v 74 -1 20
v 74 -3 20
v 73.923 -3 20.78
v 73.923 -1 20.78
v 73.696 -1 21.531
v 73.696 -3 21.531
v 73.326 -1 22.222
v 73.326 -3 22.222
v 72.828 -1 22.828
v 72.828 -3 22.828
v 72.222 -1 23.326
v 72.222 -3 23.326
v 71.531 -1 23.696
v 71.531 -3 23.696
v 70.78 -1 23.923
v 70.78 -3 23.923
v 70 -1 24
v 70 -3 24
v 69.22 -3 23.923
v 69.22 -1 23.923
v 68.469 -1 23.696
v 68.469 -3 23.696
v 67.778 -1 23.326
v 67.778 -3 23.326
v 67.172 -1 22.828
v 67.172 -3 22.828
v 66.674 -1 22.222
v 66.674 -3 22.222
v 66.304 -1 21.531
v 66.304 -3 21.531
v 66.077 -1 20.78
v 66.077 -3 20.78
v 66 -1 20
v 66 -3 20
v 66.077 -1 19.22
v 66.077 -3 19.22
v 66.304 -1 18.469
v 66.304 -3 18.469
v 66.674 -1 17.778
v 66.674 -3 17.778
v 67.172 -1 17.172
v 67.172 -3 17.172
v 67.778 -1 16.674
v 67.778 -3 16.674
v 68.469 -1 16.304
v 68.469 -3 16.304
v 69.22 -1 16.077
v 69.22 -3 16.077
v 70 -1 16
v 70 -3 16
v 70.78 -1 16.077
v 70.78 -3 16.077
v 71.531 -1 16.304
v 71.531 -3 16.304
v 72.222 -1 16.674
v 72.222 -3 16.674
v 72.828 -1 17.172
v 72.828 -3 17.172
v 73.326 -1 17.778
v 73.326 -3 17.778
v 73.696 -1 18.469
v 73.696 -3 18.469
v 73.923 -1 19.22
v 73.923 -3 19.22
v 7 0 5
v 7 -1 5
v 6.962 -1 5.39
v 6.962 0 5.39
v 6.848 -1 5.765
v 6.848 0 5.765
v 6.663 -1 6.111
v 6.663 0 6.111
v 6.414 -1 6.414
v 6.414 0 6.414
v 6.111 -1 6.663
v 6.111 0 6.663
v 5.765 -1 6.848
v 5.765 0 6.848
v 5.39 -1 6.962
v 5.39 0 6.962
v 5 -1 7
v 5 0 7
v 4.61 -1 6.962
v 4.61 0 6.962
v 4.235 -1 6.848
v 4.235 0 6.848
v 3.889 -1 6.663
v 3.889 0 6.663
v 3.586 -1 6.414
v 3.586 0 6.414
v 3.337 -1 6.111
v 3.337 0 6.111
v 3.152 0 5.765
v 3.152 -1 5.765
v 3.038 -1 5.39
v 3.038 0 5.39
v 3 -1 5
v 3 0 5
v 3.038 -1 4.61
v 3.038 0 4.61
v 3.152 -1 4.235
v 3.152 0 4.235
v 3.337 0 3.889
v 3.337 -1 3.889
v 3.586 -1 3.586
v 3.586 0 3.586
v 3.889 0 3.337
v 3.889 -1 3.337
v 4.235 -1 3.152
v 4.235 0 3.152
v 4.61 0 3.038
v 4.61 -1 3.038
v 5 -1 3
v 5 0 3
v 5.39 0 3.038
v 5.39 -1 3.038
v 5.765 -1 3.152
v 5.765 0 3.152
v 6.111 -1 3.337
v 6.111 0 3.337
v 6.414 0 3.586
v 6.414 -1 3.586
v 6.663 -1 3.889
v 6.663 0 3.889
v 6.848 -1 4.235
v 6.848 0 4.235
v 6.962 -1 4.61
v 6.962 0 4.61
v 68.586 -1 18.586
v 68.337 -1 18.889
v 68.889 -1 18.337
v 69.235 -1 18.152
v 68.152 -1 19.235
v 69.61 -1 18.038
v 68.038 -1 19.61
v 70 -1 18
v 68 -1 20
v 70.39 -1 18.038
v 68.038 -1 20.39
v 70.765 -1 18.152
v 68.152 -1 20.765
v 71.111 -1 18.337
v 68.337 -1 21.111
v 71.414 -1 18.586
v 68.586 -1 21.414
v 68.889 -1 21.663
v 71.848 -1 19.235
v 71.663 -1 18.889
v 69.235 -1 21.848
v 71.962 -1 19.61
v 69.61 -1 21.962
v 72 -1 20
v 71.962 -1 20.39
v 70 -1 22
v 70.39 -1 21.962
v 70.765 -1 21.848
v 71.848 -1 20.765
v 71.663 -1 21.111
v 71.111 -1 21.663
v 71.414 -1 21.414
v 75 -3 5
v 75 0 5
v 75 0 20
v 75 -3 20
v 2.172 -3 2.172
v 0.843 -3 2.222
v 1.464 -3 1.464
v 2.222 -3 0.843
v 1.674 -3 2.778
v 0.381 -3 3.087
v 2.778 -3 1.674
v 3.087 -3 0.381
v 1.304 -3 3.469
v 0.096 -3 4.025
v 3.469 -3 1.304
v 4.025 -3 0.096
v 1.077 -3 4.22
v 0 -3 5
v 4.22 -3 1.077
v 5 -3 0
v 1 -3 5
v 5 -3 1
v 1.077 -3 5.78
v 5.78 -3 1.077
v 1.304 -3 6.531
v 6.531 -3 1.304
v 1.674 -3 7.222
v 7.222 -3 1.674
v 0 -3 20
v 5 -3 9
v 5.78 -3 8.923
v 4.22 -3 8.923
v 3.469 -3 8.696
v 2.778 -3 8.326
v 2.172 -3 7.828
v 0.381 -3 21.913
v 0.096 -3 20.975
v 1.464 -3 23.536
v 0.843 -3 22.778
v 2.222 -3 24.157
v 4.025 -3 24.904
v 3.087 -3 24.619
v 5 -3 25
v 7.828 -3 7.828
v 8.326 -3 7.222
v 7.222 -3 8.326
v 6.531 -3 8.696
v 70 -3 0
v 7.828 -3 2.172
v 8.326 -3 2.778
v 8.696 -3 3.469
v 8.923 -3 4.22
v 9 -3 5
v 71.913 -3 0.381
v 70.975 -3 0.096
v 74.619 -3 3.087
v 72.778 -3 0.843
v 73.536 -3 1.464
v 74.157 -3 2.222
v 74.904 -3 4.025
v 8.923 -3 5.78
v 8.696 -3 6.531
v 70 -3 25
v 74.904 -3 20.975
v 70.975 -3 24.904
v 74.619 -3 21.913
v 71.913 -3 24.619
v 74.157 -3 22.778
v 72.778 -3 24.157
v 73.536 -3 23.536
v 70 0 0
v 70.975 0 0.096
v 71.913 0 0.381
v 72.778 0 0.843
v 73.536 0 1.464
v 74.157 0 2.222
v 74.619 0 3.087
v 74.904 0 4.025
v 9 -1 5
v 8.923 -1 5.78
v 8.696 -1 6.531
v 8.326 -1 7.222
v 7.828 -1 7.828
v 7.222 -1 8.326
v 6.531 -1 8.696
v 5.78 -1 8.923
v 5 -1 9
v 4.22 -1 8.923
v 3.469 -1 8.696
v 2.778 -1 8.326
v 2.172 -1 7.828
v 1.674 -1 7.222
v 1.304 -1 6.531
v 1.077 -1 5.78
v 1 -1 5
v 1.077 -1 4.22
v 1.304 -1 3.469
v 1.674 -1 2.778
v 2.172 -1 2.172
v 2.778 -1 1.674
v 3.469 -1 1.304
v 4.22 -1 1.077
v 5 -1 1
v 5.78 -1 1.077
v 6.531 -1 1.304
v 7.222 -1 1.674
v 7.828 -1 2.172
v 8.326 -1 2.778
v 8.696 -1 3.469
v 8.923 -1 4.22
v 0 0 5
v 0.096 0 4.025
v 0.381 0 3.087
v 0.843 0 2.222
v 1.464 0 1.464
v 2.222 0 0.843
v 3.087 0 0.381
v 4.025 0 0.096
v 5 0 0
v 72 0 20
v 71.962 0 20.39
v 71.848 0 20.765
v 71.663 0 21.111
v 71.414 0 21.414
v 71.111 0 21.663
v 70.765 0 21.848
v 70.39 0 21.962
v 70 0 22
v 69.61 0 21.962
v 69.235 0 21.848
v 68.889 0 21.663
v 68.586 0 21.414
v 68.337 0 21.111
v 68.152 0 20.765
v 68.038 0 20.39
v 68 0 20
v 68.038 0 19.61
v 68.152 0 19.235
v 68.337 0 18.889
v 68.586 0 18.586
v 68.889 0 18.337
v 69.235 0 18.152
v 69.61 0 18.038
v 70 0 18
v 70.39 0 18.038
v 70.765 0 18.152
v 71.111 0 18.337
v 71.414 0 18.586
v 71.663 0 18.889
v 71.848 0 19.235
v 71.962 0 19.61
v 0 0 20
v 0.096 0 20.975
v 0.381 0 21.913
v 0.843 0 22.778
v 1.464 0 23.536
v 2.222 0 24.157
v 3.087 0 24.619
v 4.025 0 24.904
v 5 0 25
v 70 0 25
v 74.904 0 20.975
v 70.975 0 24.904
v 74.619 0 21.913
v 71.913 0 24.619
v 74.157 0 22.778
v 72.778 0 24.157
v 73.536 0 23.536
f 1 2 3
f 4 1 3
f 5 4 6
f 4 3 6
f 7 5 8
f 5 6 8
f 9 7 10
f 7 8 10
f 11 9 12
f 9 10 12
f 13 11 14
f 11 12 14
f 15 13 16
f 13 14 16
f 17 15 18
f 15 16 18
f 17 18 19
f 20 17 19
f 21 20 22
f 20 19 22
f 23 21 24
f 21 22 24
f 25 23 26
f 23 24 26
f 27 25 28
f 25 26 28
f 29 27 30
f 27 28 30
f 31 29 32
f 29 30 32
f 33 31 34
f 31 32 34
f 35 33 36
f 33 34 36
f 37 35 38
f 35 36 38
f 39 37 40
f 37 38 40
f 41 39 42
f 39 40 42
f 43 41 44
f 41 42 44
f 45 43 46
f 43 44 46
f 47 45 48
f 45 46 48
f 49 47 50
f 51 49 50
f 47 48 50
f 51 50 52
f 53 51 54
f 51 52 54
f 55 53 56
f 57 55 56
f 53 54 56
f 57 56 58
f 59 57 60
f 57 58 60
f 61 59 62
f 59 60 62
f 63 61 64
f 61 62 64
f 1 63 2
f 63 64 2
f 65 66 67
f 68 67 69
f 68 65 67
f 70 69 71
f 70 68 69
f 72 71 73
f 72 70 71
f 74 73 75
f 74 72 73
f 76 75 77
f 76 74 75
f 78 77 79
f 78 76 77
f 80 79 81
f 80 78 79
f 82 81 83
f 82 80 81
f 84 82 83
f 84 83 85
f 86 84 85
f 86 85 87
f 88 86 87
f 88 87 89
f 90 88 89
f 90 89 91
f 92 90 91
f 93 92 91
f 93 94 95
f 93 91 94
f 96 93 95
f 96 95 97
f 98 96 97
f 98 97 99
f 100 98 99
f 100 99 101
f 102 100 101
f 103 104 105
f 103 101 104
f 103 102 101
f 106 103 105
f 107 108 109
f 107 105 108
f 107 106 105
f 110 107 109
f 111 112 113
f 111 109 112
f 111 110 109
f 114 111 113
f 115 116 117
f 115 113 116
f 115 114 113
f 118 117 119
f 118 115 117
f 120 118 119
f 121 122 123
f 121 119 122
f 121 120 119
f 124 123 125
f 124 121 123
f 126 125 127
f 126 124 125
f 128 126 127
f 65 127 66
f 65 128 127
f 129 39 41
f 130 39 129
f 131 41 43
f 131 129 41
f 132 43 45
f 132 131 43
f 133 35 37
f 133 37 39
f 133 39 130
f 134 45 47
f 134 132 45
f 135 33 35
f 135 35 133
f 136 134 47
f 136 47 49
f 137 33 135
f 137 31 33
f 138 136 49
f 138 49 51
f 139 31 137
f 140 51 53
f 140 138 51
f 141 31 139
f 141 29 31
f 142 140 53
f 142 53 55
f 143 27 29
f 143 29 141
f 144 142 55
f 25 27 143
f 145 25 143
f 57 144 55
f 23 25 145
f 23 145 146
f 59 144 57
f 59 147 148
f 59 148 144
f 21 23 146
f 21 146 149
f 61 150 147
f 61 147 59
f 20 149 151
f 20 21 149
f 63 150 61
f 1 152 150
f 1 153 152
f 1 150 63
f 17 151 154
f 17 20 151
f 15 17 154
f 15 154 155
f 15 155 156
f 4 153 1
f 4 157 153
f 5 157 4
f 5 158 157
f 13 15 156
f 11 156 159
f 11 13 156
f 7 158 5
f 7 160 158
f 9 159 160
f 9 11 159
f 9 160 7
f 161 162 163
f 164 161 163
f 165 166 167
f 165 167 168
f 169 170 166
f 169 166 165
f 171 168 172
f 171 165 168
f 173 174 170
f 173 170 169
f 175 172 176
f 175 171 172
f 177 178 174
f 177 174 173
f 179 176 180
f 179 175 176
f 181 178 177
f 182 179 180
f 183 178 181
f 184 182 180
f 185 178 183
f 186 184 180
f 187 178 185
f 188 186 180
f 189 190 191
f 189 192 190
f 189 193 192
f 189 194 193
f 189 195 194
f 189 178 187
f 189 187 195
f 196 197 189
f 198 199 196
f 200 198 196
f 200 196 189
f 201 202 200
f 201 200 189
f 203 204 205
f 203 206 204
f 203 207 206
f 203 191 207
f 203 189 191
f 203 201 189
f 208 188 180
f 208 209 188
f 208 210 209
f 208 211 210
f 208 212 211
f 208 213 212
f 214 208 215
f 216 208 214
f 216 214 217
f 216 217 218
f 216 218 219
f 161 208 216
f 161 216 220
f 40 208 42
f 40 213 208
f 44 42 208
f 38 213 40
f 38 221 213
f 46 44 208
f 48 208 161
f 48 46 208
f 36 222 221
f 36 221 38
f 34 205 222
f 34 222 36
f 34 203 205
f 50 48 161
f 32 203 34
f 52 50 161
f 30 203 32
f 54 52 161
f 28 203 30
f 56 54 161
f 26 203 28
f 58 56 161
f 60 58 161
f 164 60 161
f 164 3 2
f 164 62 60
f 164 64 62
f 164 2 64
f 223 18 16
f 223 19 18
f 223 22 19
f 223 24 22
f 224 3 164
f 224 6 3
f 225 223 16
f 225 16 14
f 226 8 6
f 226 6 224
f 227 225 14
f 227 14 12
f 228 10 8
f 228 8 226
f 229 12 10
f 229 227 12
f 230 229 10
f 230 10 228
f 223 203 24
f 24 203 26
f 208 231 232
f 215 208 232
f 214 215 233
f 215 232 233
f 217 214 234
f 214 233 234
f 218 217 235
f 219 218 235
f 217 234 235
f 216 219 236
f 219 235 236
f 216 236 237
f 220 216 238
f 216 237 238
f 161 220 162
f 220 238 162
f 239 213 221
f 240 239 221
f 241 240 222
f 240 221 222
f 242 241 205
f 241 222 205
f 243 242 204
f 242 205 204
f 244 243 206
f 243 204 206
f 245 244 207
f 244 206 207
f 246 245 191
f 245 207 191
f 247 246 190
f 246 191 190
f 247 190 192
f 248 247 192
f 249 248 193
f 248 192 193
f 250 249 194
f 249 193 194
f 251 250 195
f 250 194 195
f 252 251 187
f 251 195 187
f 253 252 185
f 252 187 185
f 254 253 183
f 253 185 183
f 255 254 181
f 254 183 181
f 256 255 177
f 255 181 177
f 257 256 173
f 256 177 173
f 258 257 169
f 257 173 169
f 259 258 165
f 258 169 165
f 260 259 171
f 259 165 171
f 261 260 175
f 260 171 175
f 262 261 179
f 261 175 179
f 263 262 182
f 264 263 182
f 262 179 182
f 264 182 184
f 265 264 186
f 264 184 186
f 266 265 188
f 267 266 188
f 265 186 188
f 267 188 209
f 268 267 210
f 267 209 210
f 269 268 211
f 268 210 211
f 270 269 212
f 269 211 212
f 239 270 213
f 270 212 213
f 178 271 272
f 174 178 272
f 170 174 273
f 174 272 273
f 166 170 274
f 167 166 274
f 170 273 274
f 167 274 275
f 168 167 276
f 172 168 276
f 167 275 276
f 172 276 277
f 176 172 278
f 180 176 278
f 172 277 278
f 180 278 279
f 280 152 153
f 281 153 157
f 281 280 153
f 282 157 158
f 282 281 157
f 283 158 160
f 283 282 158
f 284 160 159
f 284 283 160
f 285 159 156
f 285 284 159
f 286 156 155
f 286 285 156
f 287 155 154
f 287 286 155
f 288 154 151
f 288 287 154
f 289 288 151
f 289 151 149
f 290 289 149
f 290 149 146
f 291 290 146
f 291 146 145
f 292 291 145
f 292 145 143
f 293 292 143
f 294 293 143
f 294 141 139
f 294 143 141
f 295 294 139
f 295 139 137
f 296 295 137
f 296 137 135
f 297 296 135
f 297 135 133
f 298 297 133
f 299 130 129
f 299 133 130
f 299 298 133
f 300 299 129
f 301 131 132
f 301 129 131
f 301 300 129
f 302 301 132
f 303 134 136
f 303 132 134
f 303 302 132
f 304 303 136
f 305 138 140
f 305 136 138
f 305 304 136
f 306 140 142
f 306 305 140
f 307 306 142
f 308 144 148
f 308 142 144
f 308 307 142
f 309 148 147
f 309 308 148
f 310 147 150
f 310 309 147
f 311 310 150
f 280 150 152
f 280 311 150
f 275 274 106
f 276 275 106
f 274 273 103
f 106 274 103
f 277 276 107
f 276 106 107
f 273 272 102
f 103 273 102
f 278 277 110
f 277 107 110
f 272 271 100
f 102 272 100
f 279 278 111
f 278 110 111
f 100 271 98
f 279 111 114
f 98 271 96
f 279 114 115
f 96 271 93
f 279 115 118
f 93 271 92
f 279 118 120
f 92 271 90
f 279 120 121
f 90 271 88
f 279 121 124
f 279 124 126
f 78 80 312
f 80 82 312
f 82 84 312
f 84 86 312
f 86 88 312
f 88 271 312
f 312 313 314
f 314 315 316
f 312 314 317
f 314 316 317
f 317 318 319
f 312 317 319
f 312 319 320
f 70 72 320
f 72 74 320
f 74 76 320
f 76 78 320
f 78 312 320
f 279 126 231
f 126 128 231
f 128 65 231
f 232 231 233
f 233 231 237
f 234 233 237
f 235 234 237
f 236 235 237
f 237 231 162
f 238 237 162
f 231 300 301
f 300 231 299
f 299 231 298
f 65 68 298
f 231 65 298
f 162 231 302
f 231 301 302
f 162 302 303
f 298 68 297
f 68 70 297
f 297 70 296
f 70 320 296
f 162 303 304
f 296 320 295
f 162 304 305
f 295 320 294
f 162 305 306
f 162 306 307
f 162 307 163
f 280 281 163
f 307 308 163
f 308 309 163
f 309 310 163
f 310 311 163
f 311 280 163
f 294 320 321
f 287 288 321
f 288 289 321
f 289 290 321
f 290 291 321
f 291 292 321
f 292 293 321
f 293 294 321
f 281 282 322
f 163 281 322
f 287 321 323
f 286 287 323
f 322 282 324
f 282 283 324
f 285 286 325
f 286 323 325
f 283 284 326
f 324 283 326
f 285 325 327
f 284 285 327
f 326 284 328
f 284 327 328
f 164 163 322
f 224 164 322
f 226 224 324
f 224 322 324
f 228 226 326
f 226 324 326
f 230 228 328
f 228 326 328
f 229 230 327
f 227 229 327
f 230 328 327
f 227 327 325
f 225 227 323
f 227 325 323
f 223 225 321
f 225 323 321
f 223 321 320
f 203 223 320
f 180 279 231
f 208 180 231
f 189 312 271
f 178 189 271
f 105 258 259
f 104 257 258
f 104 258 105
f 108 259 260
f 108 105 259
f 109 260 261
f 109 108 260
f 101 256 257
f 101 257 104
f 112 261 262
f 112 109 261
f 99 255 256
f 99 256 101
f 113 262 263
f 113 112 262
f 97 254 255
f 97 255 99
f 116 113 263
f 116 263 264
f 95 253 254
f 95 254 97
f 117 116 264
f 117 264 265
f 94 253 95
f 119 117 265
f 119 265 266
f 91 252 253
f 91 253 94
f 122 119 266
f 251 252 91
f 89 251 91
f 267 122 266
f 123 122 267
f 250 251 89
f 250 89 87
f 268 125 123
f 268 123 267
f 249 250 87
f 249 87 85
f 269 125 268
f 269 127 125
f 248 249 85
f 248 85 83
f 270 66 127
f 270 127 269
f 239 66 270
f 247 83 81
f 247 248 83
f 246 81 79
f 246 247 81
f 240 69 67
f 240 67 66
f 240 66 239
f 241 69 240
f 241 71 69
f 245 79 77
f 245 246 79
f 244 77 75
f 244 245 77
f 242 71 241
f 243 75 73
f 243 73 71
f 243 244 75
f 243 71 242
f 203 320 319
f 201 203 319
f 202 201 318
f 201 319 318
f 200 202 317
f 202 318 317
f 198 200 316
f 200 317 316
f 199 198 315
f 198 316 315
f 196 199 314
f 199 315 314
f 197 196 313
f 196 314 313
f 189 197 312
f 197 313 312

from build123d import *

# Parameters (mm, degrees)
F0_R     = 2
F1_DEPTH = 3
F2_R     = 4
F3_DEPTH = 2


with BuildPart() as f1:
    # F0 (on Front) → F1 (new body)
    with BuildSketch(Plane.XZ):
        with BuildLine():
            ThreePointArc((0, 5), (1.464466, 1.464466), (5, 0))
            Line((5, 0), (70, 0))
            ThreePointArc((70, 0), (73.535534, 1.464466), (75, 5))
            Line((75, 5), (75, 20))
            ThreePointArc((75, 20), (73.535534, 23.535534), (70, 25))
            Line((70, 25), (5, 25))
            ThreePointArc((5, 25), (1.464466, 23.535534), (0, 20))
            Line((0, 20), (0, 5))
        make_face()
        with Locations((5, 5)):
            Circle(F0_R, mode=Mode.SUBTRACT)
        with Locations((70, 20)):
            Circle(F0_R, mode=Mode.SUBTRACT)
    extrude(amount=F1_DEPTH)

    # F2 (on face) → F3 (cut)
    with BuildSketch(Plane.XZ.offset(3)):
        with Locations((5, 5)):
            Circle(F2_R)
        with Locations((70, 20)):
            Circle(F2_R)
    extrude(amount=-F3_DEPTH, mode=Mode.SUBTRACT)


solid = f1.part
